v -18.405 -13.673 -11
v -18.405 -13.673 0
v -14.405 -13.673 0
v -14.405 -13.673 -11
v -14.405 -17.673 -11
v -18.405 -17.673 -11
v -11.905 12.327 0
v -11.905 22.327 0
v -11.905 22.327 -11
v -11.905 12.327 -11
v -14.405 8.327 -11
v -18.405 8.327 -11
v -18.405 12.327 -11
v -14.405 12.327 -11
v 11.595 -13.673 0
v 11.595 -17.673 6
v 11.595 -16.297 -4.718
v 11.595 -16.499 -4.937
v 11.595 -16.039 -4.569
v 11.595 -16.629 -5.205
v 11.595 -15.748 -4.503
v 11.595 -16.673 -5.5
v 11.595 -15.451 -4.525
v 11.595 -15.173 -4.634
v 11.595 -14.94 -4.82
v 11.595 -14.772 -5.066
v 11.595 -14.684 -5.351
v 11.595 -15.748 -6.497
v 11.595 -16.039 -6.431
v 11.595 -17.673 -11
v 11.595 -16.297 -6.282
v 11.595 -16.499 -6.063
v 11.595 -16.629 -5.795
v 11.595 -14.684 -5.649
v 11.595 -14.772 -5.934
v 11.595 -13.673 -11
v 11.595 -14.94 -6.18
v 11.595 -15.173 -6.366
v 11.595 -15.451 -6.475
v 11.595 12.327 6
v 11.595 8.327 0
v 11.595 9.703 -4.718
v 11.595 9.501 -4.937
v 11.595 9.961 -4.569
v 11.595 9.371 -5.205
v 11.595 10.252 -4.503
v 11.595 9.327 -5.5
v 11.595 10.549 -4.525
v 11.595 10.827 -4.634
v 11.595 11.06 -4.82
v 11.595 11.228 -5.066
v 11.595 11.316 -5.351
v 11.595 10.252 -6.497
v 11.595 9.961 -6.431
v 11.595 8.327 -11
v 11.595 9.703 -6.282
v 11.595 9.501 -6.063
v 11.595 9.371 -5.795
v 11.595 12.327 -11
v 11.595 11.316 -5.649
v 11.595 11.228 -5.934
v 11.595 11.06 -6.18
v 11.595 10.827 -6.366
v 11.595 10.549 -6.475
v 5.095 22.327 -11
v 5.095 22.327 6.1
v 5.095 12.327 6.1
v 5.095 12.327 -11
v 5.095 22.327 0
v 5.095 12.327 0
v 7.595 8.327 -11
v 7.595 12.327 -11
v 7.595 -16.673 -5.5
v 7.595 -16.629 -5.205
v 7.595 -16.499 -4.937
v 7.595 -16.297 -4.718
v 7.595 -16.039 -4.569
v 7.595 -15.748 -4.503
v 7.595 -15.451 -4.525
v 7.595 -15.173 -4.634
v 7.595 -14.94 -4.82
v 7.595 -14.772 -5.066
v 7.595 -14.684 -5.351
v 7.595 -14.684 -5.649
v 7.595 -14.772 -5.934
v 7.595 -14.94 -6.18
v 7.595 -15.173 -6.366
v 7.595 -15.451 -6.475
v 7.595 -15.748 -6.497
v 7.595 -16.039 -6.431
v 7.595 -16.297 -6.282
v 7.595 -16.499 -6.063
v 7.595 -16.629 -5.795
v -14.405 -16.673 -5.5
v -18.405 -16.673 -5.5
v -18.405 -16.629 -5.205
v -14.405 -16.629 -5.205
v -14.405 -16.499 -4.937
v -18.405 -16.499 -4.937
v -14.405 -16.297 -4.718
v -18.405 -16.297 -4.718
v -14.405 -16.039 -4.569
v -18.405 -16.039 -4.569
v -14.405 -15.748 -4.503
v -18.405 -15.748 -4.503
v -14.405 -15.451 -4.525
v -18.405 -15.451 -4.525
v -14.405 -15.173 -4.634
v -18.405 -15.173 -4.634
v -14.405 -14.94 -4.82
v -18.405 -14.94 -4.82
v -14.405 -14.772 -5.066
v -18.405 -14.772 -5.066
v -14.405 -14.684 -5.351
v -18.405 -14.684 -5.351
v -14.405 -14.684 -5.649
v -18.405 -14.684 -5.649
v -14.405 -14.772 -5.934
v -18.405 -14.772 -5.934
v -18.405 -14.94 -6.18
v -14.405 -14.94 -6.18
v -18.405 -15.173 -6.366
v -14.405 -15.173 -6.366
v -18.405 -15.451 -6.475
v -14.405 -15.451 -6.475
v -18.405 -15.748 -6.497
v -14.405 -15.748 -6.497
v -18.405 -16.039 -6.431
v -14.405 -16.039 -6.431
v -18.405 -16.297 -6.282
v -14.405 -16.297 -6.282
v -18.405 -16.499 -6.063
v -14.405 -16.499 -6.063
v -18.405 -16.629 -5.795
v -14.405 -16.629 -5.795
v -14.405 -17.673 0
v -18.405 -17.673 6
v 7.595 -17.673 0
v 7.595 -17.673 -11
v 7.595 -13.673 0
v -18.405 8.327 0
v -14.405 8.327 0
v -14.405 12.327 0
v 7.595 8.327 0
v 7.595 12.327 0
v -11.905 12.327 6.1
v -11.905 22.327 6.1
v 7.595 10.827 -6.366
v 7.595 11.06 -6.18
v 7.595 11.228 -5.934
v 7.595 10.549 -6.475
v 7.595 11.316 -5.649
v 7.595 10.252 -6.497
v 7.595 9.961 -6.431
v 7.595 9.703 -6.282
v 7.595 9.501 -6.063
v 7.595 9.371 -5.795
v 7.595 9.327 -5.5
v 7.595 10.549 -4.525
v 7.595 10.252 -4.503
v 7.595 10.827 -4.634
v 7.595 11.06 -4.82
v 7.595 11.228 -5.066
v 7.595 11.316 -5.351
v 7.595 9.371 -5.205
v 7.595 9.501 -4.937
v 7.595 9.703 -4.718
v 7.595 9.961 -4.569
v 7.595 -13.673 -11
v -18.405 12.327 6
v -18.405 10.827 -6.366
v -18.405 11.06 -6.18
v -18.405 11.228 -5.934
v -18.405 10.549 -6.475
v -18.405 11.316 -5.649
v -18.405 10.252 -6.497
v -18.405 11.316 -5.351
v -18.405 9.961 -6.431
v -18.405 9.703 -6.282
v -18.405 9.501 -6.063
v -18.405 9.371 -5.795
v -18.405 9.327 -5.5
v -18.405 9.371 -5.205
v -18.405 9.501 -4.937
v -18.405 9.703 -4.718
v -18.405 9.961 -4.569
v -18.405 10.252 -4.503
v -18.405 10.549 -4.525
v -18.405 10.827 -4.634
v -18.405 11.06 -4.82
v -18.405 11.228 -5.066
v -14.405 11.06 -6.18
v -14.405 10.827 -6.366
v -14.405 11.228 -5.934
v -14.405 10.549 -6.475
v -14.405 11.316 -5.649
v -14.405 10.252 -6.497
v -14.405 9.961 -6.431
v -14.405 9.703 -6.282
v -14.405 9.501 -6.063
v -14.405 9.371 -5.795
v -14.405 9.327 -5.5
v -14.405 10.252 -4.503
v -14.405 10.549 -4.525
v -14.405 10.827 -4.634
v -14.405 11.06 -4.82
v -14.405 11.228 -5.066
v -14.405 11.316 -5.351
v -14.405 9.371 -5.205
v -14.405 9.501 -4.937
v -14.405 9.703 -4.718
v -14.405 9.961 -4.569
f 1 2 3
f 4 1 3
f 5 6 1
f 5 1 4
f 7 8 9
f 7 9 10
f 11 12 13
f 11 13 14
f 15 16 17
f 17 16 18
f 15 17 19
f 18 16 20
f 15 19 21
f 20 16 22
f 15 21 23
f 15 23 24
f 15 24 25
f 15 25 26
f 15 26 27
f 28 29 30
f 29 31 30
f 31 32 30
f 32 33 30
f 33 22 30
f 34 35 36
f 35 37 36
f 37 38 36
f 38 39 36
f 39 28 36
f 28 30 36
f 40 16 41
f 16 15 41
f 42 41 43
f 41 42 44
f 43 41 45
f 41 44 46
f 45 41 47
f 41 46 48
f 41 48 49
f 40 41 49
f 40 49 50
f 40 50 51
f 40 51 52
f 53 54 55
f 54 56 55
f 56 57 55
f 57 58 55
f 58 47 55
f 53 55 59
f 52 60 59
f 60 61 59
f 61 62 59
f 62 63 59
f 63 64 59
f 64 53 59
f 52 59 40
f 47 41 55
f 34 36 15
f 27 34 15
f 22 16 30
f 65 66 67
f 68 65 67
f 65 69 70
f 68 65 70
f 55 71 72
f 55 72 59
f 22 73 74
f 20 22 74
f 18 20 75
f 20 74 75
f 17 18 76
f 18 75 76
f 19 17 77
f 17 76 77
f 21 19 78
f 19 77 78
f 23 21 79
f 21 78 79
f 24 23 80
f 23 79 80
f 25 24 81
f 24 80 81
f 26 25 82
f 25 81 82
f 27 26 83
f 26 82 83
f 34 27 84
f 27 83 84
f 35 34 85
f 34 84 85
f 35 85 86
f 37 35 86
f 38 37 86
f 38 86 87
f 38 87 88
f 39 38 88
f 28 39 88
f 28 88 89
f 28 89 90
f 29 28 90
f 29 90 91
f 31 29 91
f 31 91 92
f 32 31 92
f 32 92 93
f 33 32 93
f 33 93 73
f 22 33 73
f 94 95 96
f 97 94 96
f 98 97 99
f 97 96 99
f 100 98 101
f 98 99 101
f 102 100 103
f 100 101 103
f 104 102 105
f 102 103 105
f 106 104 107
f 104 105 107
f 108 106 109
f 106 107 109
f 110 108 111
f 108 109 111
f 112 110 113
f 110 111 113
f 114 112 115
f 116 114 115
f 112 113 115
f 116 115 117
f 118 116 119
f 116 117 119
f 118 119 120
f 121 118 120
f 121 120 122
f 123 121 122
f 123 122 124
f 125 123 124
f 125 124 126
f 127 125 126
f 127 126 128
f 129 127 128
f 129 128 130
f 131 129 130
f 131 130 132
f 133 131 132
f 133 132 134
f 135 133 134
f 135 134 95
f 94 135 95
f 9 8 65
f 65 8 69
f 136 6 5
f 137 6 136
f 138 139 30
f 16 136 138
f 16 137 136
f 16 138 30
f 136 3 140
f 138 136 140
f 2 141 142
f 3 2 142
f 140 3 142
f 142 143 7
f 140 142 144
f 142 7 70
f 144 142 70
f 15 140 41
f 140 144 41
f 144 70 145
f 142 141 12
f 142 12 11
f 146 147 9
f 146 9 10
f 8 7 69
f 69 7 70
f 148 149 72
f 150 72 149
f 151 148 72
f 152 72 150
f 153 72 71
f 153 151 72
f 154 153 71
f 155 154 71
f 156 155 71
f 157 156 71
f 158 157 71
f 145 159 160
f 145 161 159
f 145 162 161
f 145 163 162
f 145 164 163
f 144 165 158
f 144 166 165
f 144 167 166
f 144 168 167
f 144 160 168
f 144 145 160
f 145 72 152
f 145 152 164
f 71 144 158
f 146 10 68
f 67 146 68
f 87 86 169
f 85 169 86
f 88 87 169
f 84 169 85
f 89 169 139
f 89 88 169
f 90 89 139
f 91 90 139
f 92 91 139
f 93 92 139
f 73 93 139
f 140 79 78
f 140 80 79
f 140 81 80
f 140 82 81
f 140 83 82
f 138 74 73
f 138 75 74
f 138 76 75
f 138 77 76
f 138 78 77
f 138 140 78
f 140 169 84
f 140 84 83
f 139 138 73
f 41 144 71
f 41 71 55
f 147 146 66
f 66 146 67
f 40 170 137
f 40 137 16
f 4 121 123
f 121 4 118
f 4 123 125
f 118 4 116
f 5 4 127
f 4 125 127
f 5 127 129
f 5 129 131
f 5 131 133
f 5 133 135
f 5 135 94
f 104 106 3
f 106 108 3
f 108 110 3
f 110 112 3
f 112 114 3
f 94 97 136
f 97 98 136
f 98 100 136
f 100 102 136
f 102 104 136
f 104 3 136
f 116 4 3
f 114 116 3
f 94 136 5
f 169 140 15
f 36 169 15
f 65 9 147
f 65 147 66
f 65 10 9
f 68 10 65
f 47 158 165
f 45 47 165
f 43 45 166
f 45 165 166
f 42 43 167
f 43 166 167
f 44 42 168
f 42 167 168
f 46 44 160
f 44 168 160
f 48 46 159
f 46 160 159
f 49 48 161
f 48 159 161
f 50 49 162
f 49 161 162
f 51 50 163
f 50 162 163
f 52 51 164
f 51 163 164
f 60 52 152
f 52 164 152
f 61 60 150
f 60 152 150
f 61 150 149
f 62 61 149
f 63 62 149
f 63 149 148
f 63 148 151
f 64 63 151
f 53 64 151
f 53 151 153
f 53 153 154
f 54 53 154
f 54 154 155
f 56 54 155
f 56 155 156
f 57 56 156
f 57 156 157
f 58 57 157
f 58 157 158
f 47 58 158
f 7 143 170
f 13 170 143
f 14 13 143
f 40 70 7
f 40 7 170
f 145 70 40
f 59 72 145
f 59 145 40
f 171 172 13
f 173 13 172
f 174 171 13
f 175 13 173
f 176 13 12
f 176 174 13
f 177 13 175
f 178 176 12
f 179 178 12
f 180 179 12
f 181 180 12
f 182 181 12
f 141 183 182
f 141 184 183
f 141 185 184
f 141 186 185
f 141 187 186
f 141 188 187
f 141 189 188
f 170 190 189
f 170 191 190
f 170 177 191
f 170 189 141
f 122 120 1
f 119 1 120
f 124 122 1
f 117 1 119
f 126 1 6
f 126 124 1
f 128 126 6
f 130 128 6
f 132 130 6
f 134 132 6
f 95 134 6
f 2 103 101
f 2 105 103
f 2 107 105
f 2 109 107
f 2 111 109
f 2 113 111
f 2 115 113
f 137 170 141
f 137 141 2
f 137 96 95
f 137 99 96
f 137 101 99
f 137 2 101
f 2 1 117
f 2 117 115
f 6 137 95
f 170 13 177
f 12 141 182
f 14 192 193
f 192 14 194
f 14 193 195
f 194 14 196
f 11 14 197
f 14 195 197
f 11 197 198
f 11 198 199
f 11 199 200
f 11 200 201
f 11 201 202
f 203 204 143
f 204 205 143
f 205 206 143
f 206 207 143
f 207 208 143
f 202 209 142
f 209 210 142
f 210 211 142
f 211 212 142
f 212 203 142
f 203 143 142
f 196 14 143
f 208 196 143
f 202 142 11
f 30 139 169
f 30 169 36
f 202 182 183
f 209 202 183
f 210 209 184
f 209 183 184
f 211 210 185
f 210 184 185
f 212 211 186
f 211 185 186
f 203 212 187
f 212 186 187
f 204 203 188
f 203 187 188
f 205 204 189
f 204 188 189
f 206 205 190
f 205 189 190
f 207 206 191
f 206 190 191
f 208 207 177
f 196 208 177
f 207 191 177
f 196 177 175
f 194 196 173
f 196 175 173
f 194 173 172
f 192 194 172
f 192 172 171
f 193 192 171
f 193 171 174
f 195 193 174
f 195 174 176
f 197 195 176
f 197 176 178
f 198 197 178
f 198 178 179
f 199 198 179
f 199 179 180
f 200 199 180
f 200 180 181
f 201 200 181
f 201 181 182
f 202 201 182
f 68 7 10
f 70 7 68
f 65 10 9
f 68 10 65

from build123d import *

# Parameters (mm, degrees)
F0_W     = 30
F0_H     = 30
F1_DEPTH = 6
F2_W     = 4
F2_H     = 4
F2_W_2   = 17
F2_H_2   = 10
F3_DEPTH = 11
F5_D     = 2
F6_DEPTH = 17.1


with BuildPart() as f1:
    # F0 (on Top) → F1 (new body)
    with BuildSketch(Plane.XY):
        with Locations((-3.4046042711, -2.673180324)):
            Rectangle(F0_W, F0_H)
    extrude(amount=F1_DEPTH)

    # F2 (on face) → F3 (join)
    with BuildSketch(Plane(origin=(0, 0, 0), x_dir=(1, 0, 0), z_dir=(0, 0, -1))):
        with Locations((-16.4046042711, 15.673180324)):
            Rectangle(F2_W, F2_H)
        with Locations((-3.4046042711, -17.326819676)):
            Rectangle(F2_W_2, F2_H_2)
        with Locations((9.5953957289, 15.673180324)):
            Rectangle(F2_W, F2_H)
        with Locations((-16.4046042711, -10.326819676)):
            Rectangle(F2_W, F2_H)
        with Locations((9.5953957289, -10.326819676)):
            Rectangle(F2_W, F2_H)
    extrude(amount=F3_DEPTH)

    # F5 (through all)
    with Locations(Plane.YZ.offset(11.5953957289)):
        with Locations((-15.673180324, -5.5), (10.326819676, -5.5)):
            Hole(F5_D / 2)


with BuildPart() as f6:
    # F6 (new): a face of the model
    f6_faces = [f1.part.faces().sort_by_distance(p)[0] for p in [
        (-3.4046042711, 17.326819676, -11),
    ]]
    extrude(f6_faces, amount=-F6_DEPTH)


solid = Compound([f1.part, f6.part])
